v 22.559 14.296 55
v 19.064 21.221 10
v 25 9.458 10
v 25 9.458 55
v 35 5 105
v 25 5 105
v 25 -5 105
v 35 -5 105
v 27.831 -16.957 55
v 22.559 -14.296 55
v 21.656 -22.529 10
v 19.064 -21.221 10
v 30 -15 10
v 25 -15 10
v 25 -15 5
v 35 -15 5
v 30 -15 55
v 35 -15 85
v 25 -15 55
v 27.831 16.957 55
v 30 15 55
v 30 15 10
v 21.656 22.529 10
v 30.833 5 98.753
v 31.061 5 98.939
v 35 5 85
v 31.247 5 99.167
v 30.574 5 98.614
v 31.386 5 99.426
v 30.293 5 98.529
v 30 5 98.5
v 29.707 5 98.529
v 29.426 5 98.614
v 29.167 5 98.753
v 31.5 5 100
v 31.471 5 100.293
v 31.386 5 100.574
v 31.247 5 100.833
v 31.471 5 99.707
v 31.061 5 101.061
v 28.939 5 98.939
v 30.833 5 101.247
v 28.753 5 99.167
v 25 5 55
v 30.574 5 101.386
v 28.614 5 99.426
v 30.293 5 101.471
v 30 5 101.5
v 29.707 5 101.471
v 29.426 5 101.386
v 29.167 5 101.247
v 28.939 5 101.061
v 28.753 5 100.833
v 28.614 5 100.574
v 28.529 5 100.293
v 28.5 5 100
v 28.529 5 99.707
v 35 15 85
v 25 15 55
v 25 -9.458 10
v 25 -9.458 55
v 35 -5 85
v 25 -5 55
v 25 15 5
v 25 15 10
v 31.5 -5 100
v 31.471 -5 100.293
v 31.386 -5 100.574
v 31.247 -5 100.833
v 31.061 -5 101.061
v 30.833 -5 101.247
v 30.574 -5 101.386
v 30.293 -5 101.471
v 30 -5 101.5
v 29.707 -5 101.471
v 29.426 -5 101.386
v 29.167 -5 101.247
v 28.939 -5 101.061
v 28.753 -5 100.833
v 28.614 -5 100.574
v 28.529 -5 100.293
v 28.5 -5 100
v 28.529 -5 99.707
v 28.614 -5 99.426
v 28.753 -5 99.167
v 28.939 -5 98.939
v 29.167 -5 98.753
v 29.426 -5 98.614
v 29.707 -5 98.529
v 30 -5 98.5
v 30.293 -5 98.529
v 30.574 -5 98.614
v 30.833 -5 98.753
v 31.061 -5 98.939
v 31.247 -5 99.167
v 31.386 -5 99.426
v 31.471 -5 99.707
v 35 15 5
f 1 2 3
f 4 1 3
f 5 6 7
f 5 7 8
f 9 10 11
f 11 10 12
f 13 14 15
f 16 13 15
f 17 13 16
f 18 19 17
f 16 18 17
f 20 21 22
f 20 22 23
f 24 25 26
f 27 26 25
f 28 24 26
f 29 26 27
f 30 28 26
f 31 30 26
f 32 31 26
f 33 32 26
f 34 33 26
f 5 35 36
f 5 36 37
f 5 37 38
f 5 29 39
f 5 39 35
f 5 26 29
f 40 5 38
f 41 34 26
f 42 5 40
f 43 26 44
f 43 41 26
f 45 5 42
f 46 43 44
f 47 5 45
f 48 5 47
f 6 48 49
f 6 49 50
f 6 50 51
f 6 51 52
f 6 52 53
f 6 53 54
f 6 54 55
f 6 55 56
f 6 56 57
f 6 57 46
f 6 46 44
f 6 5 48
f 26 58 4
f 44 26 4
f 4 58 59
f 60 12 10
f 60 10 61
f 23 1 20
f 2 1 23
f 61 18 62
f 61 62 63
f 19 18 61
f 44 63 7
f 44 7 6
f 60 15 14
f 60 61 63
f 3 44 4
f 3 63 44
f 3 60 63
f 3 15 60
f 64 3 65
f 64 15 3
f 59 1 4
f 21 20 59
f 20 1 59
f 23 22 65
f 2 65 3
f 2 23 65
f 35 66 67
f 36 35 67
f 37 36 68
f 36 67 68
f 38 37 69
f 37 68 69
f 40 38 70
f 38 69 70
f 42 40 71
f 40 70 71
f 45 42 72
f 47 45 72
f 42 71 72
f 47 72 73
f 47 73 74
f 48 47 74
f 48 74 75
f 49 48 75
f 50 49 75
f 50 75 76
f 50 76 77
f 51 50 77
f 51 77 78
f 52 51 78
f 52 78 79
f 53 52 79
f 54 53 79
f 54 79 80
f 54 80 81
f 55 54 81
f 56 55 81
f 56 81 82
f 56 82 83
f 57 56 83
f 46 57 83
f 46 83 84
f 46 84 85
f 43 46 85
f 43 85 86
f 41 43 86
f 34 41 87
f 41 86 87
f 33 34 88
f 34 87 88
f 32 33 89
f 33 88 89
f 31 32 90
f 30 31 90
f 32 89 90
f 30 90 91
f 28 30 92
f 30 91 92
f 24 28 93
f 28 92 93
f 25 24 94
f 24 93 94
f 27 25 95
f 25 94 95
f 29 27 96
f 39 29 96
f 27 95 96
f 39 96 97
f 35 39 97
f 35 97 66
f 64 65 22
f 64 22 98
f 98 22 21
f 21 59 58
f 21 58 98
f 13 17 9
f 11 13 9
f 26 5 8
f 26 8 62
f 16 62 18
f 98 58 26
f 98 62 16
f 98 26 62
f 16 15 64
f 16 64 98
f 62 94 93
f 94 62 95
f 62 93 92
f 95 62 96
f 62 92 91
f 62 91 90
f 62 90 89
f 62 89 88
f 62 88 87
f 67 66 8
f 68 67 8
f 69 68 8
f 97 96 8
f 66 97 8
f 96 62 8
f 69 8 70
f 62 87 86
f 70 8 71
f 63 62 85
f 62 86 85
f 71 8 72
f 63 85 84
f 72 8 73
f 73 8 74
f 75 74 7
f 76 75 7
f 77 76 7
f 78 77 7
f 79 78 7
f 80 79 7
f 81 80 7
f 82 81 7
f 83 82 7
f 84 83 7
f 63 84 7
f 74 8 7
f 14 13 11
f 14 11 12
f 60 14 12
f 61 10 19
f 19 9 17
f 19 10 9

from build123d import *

# Parameters (mm, degrees)
CROQUIS1_R              = 55
CROQUIS1_W              = 45
CROQUIS1_H              = 15
SALIENTE_EXTRUIR1_DEPTH = 10
CROQUIS2_W              = 10
CROQUIS2_H              = 30
SALIENTE_EXTRUIR2_DEPTH = 95
CROQUIS3_R              = 1.5
CORTAR_EXTRUIR1_DEPTH   = 50
CORTAR_EXTRUIR2_DEPTH   = 10
CROQUIS5_R              = 2.5
CORTAR_EXTRUIR3_DEPTH   = 85
CROQUIS7_R              = 2.5
SALIENTE_EXTRUIR3_DEPTH = 5
CORTAR_EXTRUIR4_DEPTH   = 10
CROQUIS10_R             = 2.575
CROQUIS11_OUTSIDE_W     = 149.536
CROQUIS11_OUTSIDE_H     = 144.536
CROQUIS11_OUTSIDE_W_2   = 10
CROQUIS11_OUTSIDE_H_2   = 100
CORTAR_EXTRUIR5_DEPTH   = 105.5
CROQUIS12_OUTSIDE_W     = 40.072
CROQUIS12_OUTSIDE_H     = 128.052
CROQUIS12_OUTSIDE_W_2   = 10
CROQUIS12_OUTSIDE_H_2   = 30
CORTAR_EXTRUIR6_DEPTH   = 10
SALIENTE_EXTRUIR4_DEPTH = 50
CORTAR_EXTRUIR7_DEPTH   = 30
CROQUIS18_OUTSIDE_W     = 40.218
CROQUIS18_OUTSIDE_H     = 70.744
CROQUIS18_OUTSIDE_W_2   = 10
CROQUIS18_OUTSIDE_H_2   = 30
CORTAR_EXTRUIR8_DEPTH   = 5


with BuildPart() as part:
    # Croquis1 → Saliente-Extruir1 (new body)
    with BuildSketch(Plane.XY):
        Circle(CROQUIS1_R)
        with Locations((0, -2.5)):
            Rectangle(CROQUIS1_W, CROQUIS1_H, mode=Mode.SUBTRACT)
    extrude(amount=SALIENTE_EXTRUIR1_DEPTH)

    # Croquis2 → Saliente-Extruir2 (add)
    with BuildSketch(Plane.XY.offset(10)):
        with Locations((30, 0)):
            Rectangle(CROQUIS2_W, CROQUIS2_H)
    extrude(amount=SALIENTE_EXTRUIR2_DEPTH)

    # Croquis3 → Cortar-Extruir1 (cut)
    with BuildSketch(Plane.XZ.offset(15)):
        with Locations((30, 100)):
            Circle(CROQUIS3_R)
    extrude(amount=-CORTAR_EXTRUIR1_DEPTH, mode=Mode.SUBTRACT)

    # Croquis4 → Cortar-Extruir2 (cut)
    with BuildSketch(Plane.XZ.offset(15)):
        Polygon((35, 85), (25, 55), (25, 95), (25, 105), (35, 105), align=None)
    cortar_extruir2 = extrude(amount=-CORTAR_EXTRUIR2_DEPTH, mode=Mode.SUBTRACT)

    # Simetría1: Cortar-Extruir2 across plane
    add(cortar_extruir2.mirror(Plane.ZX), mode=Mode.SUBTRACT)

    # Croquis5 → Cortar-Extruir3 (cut, symmetric)
    with BuildSketch(Plane.XZ.offset(-5)):
        with Locations(Location((0, 5, 0), (0, 0, 270))):
            Circle(CROQUIS5_R)
    extrude(amount=CORTAR_EXTRUIR3_DEPTH, both=True, mode=Mode.SUBTRACT)

    # Croquis7 → Saliente-Extruir3 (add)
    with BuildSketch(Plane.XY.offset(10)):
        with Locations((0, 48.5)):
            Circle(CROQUIS7_R)
    extrude(amount=SALIENTE_EXTRUIR3_DEPTH)

    # Croquis8 → Cortar-Extruir4 (cut)
    with BuildSketch(Plane.XY.offset(10)):
        with BuildLine():
            Line((8.999999995, 39.891287847), (8.999999995, 38.6))
            Line((8.999999995, 38.6), (7.708712148, 38.6))
            ThreePointArc((7.708712148, 38.6), (7.499999995, 37.6), (7.708712148, 36.6))
            Line((7.708712148, 36.6), (8.999999995, 36.6))
            Line((8.999999995, 36.6), (8.999999995, 35.308712153))
            ThreePointArc((8.999999995, 35.308712153), (9.999999995, 35.1), (10.999999995, 35.308712153))
            Line((10.999999995, 35.308712153), (10.999999995, 36.6))
            Line((10.999999995, 36.6), (12.291287843, 36.6))
            ThreePointArc((12.291287843, 36.6), (12.499999995, 37.6), (12.291287843, 38.6))
            Line((12.291287843, 38.6), (10.999999995, 38.6))
            Line((10.999999995, 38.6), (10.999999995, 39.891287847))
            ThreePointArc((10.999999995, 39.891287847), (9.999999995, 40.1), (8.999999995, 39.891287847))
        make_face()
        with BuildLine():
            Line((-7.708712157, 36.6), (-9.000000005, 36.6))
            Line((-9.000000005, 36.6), (-9.000000005, 35.308712153))
            ThreePointArc((-9.000000005, 35.308712153), (-10.000000005, 35.1), (-11.000000005, 35.308712153))
            Line((-11.000000005, 35.308712153), (-11.000000005, 36.6))
            Line((-11.000000005, 36.6), (-12.291287852, 36.6))
            ThreePointArc((-12.291287852, 36.6), (-12.500000005, 37.6), (-12.291287852, 38.6))
            Line((-12.291287852, 38.6), (-11.000000005, 38.6))
            Line((-11.000000005, 38.6), (-11.000000005, 39.891287847))
            ThreePointArc((-11.000000005, 39.891287847), (-10.000000005, 40.1), (-9.000000005, 39.891287847))
            Line((-9.000000005, 39.891287847), (-9.000000005, 38.6))
            Line((-9.000000005, 38.6), (-7.708712157, 38.6))
            ThreePointArc((-7.708712157, 38.6), (-7.500000005, 37.6), (-7.708712157, 36.6))
        make_face()
        with BuildLine():
            Line((-7.708712153, -35.749999986), (-9, -35.749999986))
            Line((-9, -35.749999986), (-9, -37.041287833))
            ThreePointArc((-9, -37.041287833), (-10, -37.249999986), (-11, -37.041287833))
            Line((-11, -37.041287833), (-11, -35.749999986))
            Line((-11, -35.749999986), (-12.291287847, -35.749999986))
            ThreePointArc((-12.291287847, -35.749999986), (-12.5, -34.749999986), (-12.291287847, -33.749999986))
            Line((-12.291287847, -33.749999986), (-11, -33.749999986))
            Line((-11, -33.749999986), (-11, -32.458712138))
            ThreePointArc((-11, -32.458712138), (-10, -32.249999986), (-9, -32.458712138))
            Line((-9, -32.458712138), (-9, -33.749999986))
            Line((-9, -33.749999986), (-7.708712153, -33.749999986))
            ThreePointArc((-7.708712153, -33.749999986), (-7.5, -34.749999986), (-7.708712153, -35.749999986))
        make_face()
        with BuildLine():
            Line((8.999999991, -35.749999986), (8.999999991, -37.041287833))
            ThreePointArc((8.999999991, -37.041287833), (9.999999991, -37.249999986), (10.999999991, -37.041287833))
            Line((10.999999991, -37.041287833), (10.999999991, -35.749999986))
            Line((10.999999991, -35.749999986), (12.291287838, -35.749999986))
            ThreePointArc((12.291287838, -35.749999986), (12.499999991, -34.749999986), (12.291287838, -33.749999986))
            Line((12.291287838, -33.749999986), (10.999999991, -33.749999986))
            Line((10.999999991, -33.749999986), (10.999999991, -32.458712138))
            ThreePointArc((10.999999991, -32.458712138), (9.999999991, -32.249999986), (8.999999991, -32.458712138))
            Line((8.999999991, -32.458712138), (8.999999991, -33.749999986))
            Line((8.999999991, -33.749999986), (7.708712143, -33.749999986))
            ThreePointArc((7.708712143, -33.749999986), (7.499999991, -34.749999986), (7.708712143, -35.749999986))
            Line((7.708712143, -35.749999986), (8.999999991, -35.749999986))
        make_face()
    extrude(amount=-CORTAR_EXTRUIR4_DEPTH, mode=Mode.SUBTRACT)

    # Croquis10 → Cortar-Revolución1 (revolve, cut)
    with BuildSketch(Plane(origin=(0, 0, 0), x_dir=(1, 0, 0), z_dir=(0, 1, 0))):
        with Locations((-55, -5)):
            Circle(CROQUIS10_R)
    revolve(axis=Axis((0, 0, 0), (0, 0, 1)), mode=Mode.SUBTRACT)

    # Croquis11 outside → Cortar-Extruir5 (cut, symmetric)
    with BuildSketch(Plane(origin=(0, 15, 0), x_dir=(1, 0, 0), z_dir=(0, 1, 0))):
        with Locations((0, -52.5)):
            Rectangle(CROQUIS11_OUTSIDE_W, CROQUIS11_OUTSIDE_H)
        with Locations((30, -55)):
            Rectangle(CROQUIS11_OUTSIDE_W_2, CROQUIS11_OUTSIDE_H_2, mode=Mode.SUBTRACT)
    extrude(amount=CORTAR_EXTRUIR5_DEPTH, both=True, mode=Mode.SUBTRACT)

    # Croquis12 outside → Cortar-Extruir6 (cut)
    with BuildSketch(Plane.XY.offset(10)):
        with Locations((30, 0)):
            Rectangle(CROQUIS12_OUTSIDE_W, CROQUIS12_OUTSIDE_H)
        with Locations((30, 0)):
            Rectangle(CROQUIS12_OUTSIDE_W_2, CROQUIS12_OUTSIDE_H_2, mode=Mode.SUBTRACT)
    extrude(amount=-CORTAR_EXTRUIR6_DEPTH, mode=Mode.SUBTRACT)

    # Croquis15 → Saliente-Extruir4 (add)
    with BuildSketch(Plane(origin=(0, 0, 5), x_dir=(-1, 0, 0), z_dir=(0, 0, -1))):
        Polygon((-30, 15), (-20.877471703, 23.230682918), (-19.064126659, 21.220850729), (-25, 9.458219088), align=None)
    saliente_extruir4 = extrude(amount=-SALIENTE_EXTRUIR4_DEPTH)

    # Croquis17 → Cortar-Extruir7 (cut)
    with BuildSketch(Plane(origin=(23.729923141, 11.975025866, 0), x_dir=(0, 0, 1), z_dir=(-0.8927647254437483, -0.4505231903058363, 0))):
        Polygon((55, 2.599765556), (10, 10.356395812), (-8.093174243, 24.440719527), (32.70757592, 13.533993104), (58.299435985, 13.533993104), align=None)
    cortar_extruir7 = extrude(amount=-CORTAR_EXTRUIR7_DEPTH, mode=Mode.SUBTRACT)

    # Simetría2: Saliente-Extruir4, Cortar-Extruir7 across plane
    add(saliente_extruir4.mirror(Plane.ZX))
    add(cortar_extruir7.mirror(Plane.ZX), mode=Mode.SUBTRACT)

    # Croquis18 outside → Cortar-Extruir8 (cut)
    with BuildSketch(Plane(origin=(0, 0, 5), x_dir=(-1, 0, 0), z_dir=(0, 0, -1))):
        with Locations((-27.032, 0)):
            Rectangle(CROQUIS18_OUTSIDE_W, CROQUIS18_OUTSIDE_H)
        with Locations((-30, 0)):
            Rectangle(CROQUIS18_OUTSIDE_W_2, CROQUIS18_OUTSIDE_H_2, mode=Mode.SUBTRACT)
    extrude(amount=-CORTAR_EXTRUIR8_DEPTH, mode=Mode.SUBTRACT)


solid = part.part
